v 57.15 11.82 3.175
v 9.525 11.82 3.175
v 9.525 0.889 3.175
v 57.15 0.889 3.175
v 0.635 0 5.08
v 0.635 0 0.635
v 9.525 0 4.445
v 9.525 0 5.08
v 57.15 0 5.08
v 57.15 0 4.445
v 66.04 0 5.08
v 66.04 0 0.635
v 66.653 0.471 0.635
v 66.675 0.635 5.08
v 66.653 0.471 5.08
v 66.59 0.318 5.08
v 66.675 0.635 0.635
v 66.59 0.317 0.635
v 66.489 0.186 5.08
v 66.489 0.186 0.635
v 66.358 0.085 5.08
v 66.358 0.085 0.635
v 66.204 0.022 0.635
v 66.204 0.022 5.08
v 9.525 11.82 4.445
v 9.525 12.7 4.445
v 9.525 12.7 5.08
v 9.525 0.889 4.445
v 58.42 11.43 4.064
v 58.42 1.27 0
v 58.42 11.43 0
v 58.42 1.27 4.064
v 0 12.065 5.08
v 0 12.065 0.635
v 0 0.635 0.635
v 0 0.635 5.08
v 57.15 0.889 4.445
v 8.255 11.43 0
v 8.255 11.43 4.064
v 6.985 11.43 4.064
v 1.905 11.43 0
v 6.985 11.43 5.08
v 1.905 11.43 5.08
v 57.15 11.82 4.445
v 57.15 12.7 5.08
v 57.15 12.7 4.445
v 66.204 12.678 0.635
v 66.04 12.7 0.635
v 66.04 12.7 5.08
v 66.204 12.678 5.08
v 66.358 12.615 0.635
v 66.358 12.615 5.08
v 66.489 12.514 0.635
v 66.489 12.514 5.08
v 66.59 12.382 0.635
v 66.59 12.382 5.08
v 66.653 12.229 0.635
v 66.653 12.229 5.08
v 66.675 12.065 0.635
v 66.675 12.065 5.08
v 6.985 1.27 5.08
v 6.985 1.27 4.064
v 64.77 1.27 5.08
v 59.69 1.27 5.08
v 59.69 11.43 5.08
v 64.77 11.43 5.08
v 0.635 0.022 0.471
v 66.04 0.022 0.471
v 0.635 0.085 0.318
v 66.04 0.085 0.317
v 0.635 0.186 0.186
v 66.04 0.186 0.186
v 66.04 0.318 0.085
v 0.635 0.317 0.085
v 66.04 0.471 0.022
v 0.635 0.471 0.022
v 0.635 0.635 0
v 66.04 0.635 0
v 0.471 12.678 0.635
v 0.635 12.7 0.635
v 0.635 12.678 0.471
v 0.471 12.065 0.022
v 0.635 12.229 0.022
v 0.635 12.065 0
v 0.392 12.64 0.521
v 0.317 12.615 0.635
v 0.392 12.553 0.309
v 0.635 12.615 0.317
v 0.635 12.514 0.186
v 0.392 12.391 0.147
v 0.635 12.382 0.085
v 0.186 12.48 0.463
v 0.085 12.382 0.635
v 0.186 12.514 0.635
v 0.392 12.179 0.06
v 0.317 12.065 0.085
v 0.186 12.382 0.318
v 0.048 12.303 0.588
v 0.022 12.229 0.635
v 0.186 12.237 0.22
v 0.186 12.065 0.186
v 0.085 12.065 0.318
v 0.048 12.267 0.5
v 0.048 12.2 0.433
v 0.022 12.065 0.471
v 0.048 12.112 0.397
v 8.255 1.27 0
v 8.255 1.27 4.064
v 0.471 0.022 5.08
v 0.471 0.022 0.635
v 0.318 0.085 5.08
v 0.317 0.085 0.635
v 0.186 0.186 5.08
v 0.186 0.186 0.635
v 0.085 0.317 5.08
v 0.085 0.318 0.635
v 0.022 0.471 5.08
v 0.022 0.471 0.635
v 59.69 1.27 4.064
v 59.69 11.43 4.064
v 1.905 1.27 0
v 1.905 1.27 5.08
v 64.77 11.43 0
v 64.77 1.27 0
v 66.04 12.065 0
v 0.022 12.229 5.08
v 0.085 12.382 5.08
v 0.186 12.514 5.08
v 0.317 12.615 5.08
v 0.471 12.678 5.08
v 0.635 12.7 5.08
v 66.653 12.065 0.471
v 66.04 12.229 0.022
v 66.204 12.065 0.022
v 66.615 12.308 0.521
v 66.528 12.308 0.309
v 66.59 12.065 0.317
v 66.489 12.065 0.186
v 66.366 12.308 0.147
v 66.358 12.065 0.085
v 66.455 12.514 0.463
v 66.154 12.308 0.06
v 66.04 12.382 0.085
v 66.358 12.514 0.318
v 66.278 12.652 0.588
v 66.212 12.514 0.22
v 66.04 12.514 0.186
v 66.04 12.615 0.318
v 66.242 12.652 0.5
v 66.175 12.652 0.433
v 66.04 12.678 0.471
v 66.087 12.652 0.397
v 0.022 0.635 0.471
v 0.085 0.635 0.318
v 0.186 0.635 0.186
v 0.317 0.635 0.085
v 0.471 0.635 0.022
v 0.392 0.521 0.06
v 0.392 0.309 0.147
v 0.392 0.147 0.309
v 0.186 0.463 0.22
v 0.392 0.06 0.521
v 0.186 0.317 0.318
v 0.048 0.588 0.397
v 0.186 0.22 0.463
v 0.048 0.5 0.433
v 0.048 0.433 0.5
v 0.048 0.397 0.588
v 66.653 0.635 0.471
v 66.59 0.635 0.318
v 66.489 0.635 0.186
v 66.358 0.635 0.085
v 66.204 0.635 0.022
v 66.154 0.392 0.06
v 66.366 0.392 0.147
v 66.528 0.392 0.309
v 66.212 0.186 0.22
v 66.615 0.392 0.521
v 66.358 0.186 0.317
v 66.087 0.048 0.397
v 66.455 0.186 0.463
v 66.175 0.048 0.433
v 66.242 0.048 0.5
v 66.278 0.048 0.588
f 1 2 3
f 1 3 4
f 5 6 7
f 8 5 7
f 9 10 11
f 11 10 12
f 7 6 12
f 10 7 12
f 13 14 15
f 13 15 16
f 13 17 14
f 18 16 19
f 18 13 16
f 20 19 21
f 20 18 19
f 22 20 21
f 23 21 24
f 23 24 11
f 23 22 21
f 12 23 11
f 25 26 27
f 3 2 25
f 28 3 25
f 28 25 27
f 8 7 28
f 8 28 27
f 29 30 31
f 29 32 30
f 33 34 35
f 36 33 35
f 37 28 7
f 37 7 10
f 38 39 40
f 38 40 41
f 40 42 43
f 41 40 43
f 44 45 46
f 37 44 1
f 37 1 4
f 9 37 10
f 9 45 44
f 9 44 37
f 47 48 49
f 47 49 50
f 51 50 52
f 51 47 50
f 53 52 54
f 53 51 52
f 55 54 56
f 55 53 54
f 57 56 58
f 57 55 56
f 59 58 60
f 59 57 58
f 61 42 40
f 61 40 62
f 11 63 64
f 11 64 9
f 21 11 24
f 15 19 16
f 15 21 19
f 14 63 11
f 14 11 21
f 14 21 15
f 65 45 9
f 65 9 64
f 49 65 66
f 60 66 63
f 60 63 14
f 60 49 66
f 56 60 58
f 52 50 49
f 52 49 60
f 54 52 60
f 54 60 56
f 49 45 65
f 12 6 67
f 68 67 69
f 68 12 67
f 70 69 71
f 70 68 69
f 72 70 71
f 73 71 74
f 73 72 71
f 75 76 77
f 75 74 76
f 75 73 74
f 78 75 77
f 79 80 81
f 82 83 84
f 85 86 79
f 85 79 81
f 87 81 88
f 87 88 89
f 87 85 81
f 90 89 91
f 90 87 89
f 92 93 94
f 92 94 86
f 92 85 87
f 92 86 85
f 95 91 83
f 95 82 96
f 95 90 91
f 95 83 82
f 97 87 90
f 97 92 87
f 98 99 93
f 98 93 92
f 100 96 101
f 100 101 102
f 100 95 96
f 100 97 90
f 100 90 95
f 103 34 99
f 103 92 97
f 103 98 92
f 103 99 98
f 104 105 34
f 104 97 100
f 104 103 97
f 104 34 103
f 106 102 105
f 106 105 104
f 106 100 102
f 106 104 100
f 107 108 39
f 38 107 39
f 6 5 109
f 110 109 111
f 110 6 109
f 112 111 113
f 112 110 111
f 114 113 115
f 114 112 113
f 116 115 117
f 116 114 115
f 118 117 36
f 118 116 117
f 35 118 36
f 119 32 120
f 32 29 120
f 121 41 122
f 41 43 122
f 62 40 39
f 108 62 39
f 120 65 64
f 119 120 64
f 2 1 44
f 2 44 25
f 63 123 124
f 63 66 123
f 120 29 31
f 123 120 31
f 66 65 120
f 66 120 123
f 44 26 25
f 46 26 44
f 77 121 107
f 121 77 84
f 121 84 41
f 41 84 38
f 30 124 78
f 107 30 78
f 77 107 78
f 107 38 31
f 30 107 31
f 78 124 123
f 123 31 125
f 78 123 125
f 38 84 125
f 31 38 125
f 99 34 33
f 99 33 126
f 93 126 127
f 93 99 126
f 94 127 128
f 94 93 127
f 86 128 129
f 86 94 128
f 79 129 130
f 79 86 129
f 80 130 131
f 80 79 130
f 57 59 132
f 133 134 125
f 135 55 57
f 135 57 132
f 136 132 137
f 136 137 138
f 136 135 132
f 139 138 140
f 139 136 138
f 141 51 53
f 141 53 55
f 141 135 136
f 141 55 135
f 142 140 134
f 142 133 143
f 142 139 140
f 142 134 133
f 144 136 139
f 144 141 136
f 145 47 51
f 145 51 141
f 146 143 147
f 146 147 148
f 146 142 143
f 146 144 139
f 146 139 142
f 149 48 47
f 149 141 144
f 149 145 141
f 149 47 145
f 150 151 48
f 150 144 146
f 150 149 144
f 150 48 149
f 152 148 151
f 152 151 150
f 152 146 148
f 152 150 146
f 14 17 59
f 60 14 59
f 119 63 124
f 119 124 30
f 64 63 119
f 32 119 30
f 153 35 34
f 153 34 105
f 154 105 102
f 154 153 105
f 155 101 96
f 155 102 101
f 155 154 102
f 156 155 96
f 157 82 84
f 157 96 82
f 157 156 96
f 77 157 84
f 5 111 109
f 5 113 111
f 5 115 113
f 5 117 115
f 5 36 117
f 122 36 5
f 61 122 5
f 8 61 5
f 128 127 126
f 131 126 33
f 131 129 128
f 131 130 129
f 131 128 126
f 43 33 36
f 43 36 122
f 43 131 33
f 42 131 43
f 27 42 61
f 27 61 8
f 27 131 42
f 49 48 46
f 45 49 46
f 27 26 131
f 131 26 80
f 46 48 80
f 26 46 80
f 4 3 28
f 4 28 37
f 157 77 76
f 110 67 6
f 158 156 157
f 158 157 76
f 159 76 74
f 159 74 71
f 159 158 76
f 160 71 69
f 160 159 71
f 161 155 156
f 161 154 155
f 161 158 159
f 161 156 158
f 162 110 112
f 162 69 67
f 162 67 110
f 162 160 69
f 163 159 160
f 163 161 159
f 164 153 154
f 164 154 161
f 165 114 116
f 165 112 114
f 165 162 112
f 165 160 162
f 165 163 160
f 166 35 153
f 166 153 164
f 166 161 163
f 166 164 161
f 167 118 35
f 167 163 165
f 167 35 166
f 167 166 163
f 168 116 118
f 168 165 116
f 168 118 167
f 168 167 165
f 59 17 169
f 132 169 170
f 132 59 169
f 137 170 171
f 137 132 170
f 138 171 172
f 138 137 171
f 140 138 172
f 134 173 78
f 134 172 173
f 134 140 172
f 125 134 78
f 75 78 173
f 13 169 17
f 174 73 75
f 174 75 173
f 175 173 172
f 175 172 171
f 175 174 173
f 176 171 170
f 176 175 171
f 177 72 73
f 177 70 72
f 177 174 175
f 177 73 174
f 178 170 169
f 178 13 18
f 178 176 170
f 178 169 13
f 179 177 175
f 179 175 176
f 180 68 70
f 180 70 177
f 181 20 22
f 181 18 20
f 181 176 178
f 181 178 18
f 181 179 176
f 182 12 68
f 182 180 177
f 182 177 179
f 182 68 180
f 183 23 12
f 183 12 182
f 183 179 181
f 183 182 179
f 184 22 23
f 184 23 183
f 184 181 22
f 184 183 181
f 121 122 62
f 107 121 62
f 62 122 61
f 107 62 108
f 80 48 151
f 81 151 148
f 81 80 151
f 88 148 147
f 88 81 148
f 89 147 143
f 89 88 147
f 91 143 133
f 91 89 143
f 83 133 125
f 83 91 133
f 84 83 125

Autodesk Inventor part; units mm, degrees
ref_plane "YZ Plane" through (0, 0, 0) normal (1, 0, 0) x (0, 1, 0)
ref_plane "XZ Plane" through (0, 0, 0) normal (0, 1, 0) x (-1, 0, 0)
ref_plane "XY Plane" through (0, 0, 0) normal (0, 0, 1) x (1, 0, 0)
sketch "Sketch1" plane through (0, 0, 0) normal (0, 0, 1) x (1, 0, 0)
  line L0 (0, 0) -> (66.675, 0)
  line L1 (66.675, 0) -> (66.675, 12.7)
  line L2 (66.675, 12.7) -> (0, 12.7)
  line L3 (0, 12.7) -> (0, 0)
  dimension "d0" = 66.675
  dimension "d1" = 12.7
extrude "Extrusion1" add sketch "Sketch1" along normal blind 5.08
fillet "Fillet1" radius 0.635 4 edges at (33.3375, 12.7, 0) (66.675, 6.35, 0) (33.3375, 0, 0) (0, 6.35, 0)
fillet "Fillet2" radius 0.635 8 edges at (66.489, 12.514, 0.186) (66.675, 12.7, 2.8575) (66.489, 0.186, 0.186) (66.675, 0, 2.8575) (0.186, 12.514, 0.186) (0, 12.7, 2.8575) (0.186, 0.186, 0.186) (0, 0, 2.8575)
sketch "Sketch2" plane through (0, 0, 5.08) normal (0, 0, 1) x (1, 0, 0)
  line L0 (9.525, 12.6996) -> (57.15, 12.6996)
  line L1 (57.15, 12.6996) -> (57.15, -0.0004)
  line L2 (57.15, -0.0004) -> (9.525, -0.0004)
  line L3 (9.525, -0.0004) -> (9.525, 12.6996)
  line L4 (66.675, 0.635) -> (66.675, 12.065) projected
  point P0 (0, 0)
  dimension "d6" = 47.625
  dimension "d7" = 12.7
  dimension "d8" = 9.525
extrude "Extrusion2" cut sketch "Sketch2" against normal blind 1.905
sketch "Sketch3" plane through (9.525, 12.6996, 5.08) normal (0, -1, 0) x (1, 0, 0)
  line L0 (0, -1.905) -> (0, 0) projected
  line L1 (47.625, -1.905) -> (0, -1.905) projected
  line L2 (0, 0) -> (47.625, 0)
  line L3 (47.625, 0) -> (47.625, -1.905)
  line L4 (47.625, -1.905) -> (0, -1.905)
  line L5 (0, -1.905) -> (0, 0)
  point P0 (-9.525, -5.08)
extrude "Extrusion3" cut sketch "Sketch3" against normal blind 0.635
sketch "Sketch4" plane through (0, 0, 5.08) normal (0, 0, 1) x (1, 0, 0)
  line L0 (0.635, 0.635) -> (66.04, 0.635) projected
  line L1 (58.42, 11.43) -> (59.69, 11.43)
  line L2 (59.69, 11.43) -> (59.69, 1.27)
  line L3 (59.69, 1.27) -> (58.42, 1.27)
  line L4 (58.42, 1.27) -> (58.42, 11.43)
  line L5 (66.04, 12.7) -> (0.635, 12.7) projected
  line L6 (57.15, 12.7) -> (57.15, 0) projected
  line L7 (57.15, 0) -> (66.04, 0) projected
  point P0 (0, 0)
  point P1 (53.975, 6.9846)
  dimension "d13" = 1.27
  dimension "d23" = 1.27
  dimension "d24" = 1.27
  dimension "d42" = 1.27
sketch "Sketch5" plane through (0, 0, 5.08) normal (0, 0, 1) x (1, 0, 0)
  line L0 (66.04, 12.065) -> (0.635, 12.065) projected
  line L1 (0.635, 0.635) -> (66.04, 0.635) projected
  line L2 (58.42, 11.43) -> (64.77, 11.43)
  line L3 (64.77, 11.43) -> (64.77, 1.27)
  line L4 (64.77, 1.27) -> (58.42, 1.27)
  line L5 (58.42, 1.27) -> (58.42, 11.43)
  line L6 (57.15, 12.7) -> (57.15, 0) projected
  line L7 (66.04, 12.7) -> (57.15, 12.7) projected
  line L8 (57.15, 0) -> (66.04, 0) projected
  point P0 (0, 0)
  point P1 (53.975, 6.9846)
  dimension "d14" = 6.35
  dimension "d25" = 1.27
  dimension "d43" = 1.27
  dimension "d44" = 1.27
extrude "Extrusion4" cut sketch "Sketch5" against normal through all
extrude "Extrusion5" add sketch "Sketch4" against normal blind 1.016
sketch "Sketch6" plane through (0, 0, 5.08) normal (0, 0, 1) x (1, 0, 0)
  line L0 (57.15, 12.7) -> (57.15, 0) projected
  line L1 (55.245, 0.635) -> (55.245, 12.065) projected
  line L2 (66.04, 12.065) -> (0.635, 12.065) projected
  line L3 (8.255, 11.43) -> (6.985, 11.43)
  line L4 (6.985, 11.43) -> (6.985, 1.27)
  line L5 (6.985, 1.27) -> (8.255, 1.27)
  line L6 (8.255, 1.27) -> (8.255, 11.43)
  line L7 (9.525, 0) -> (9.525, 12.7) projected
  line L8 (0.635, 0.635) -> (66.04, 0.635) projected
  line L9 (9.525, 12.7) -> (0.635, 12.7) projected
  line L10 (0.635, 0) -> (9.525, 0) projected
  point P0 (0, 0)
  point P1 (53.975, 6.9846)
  point P2 (6.35, 6.9846)
  dimension "d20" = 1.27
  dimension "d22" = 1.27
  dimension "d45" = 1.27
  dimension "d46" = 1.27
sketch "Sketch7" plane through (0, 0, 5.08) normal (0, 0, 1) x (1, 0, 0)
  line L0 (66.04, 12.065) -> (0.635, 12.065) projected
  line L1 (8.255, 11.43) -> (1.905, 11.43)
  line L2 (1.905, 11.43) -> (1.905, 1.27)
  line L3 (1.905, 1.27) -> (8.255, 1.27)
  line L4 (8.255, 1.27) -> (8.255, 11.43)
  line L5 (9.525, 0) -> (9.525, 12.7) projected
  line L6 (0.635, 0.635) -> (66.04, 0.635) projected
  line L7 (9.525, 12.7) -> (0.635, 12.7) projected
  line L8 (0.635, 0) -> (9.525, 0) projected
  point P0 (0, 0)
  point P1 (55.245, 12.065)
  point P2 (6.35, 6.9846)
  point P3 (55.245, 0.635)
  dimension "d26" = 6.35
  dimension "d28" = 1.27
  dimension "d47" = 1.27
  dimension "d48" = 1.27
extrude "Extrusion6" cut sketch "Sketch7" against normal through all
extrude "Extrusion7" add sketch "Sketch6" against normal blind 1.016 contours L6 L5 L4 L3
sketch "Sketch9" plane through (0, 0, 3.175) normal (0, 0, 1) x (1, 0, 0)
  line L0 (9.525, 0) -> (9.525, 12.7) projected
  line L1 (57.15, 12.7) -> (57.15, 0) projected
  line L2 (9.525, 12.7) -> (57.15, 12.7)
  line L3 (57.15, 12.7) -> (57.15, 11.8197)
  line L4 (57.15, 11.8197) -> (9.525, 11.8197)
  line L5 (9.525, 11.8197) -> (9.525, 12.7)
  line L6 (66.04, 0) -> (0.635, 0) projected
  line L7 (57.15, 0) -> (9.525, 0)
  line L8 (9.525, 0) -> (9.525, 0.889)
  line L9 (9.525, 0.889) -> (57.15, 0.889)
  line L10 (57.15, 0.889) -> (57.15, 0)
  point P0 (0, 0)
  point P1 (6.35, 6.9846)
  point P2 (53.975, 6.9846)
  dimension "d35" = 47.625
  dimension "d36" = 0.889
extrude "Extrusion8" add sketch "Sketch9" along normal blind 1.27 contours L0 L9 L1 L6 | L0 L2 L1 L4
properties part number "clipFemale"
